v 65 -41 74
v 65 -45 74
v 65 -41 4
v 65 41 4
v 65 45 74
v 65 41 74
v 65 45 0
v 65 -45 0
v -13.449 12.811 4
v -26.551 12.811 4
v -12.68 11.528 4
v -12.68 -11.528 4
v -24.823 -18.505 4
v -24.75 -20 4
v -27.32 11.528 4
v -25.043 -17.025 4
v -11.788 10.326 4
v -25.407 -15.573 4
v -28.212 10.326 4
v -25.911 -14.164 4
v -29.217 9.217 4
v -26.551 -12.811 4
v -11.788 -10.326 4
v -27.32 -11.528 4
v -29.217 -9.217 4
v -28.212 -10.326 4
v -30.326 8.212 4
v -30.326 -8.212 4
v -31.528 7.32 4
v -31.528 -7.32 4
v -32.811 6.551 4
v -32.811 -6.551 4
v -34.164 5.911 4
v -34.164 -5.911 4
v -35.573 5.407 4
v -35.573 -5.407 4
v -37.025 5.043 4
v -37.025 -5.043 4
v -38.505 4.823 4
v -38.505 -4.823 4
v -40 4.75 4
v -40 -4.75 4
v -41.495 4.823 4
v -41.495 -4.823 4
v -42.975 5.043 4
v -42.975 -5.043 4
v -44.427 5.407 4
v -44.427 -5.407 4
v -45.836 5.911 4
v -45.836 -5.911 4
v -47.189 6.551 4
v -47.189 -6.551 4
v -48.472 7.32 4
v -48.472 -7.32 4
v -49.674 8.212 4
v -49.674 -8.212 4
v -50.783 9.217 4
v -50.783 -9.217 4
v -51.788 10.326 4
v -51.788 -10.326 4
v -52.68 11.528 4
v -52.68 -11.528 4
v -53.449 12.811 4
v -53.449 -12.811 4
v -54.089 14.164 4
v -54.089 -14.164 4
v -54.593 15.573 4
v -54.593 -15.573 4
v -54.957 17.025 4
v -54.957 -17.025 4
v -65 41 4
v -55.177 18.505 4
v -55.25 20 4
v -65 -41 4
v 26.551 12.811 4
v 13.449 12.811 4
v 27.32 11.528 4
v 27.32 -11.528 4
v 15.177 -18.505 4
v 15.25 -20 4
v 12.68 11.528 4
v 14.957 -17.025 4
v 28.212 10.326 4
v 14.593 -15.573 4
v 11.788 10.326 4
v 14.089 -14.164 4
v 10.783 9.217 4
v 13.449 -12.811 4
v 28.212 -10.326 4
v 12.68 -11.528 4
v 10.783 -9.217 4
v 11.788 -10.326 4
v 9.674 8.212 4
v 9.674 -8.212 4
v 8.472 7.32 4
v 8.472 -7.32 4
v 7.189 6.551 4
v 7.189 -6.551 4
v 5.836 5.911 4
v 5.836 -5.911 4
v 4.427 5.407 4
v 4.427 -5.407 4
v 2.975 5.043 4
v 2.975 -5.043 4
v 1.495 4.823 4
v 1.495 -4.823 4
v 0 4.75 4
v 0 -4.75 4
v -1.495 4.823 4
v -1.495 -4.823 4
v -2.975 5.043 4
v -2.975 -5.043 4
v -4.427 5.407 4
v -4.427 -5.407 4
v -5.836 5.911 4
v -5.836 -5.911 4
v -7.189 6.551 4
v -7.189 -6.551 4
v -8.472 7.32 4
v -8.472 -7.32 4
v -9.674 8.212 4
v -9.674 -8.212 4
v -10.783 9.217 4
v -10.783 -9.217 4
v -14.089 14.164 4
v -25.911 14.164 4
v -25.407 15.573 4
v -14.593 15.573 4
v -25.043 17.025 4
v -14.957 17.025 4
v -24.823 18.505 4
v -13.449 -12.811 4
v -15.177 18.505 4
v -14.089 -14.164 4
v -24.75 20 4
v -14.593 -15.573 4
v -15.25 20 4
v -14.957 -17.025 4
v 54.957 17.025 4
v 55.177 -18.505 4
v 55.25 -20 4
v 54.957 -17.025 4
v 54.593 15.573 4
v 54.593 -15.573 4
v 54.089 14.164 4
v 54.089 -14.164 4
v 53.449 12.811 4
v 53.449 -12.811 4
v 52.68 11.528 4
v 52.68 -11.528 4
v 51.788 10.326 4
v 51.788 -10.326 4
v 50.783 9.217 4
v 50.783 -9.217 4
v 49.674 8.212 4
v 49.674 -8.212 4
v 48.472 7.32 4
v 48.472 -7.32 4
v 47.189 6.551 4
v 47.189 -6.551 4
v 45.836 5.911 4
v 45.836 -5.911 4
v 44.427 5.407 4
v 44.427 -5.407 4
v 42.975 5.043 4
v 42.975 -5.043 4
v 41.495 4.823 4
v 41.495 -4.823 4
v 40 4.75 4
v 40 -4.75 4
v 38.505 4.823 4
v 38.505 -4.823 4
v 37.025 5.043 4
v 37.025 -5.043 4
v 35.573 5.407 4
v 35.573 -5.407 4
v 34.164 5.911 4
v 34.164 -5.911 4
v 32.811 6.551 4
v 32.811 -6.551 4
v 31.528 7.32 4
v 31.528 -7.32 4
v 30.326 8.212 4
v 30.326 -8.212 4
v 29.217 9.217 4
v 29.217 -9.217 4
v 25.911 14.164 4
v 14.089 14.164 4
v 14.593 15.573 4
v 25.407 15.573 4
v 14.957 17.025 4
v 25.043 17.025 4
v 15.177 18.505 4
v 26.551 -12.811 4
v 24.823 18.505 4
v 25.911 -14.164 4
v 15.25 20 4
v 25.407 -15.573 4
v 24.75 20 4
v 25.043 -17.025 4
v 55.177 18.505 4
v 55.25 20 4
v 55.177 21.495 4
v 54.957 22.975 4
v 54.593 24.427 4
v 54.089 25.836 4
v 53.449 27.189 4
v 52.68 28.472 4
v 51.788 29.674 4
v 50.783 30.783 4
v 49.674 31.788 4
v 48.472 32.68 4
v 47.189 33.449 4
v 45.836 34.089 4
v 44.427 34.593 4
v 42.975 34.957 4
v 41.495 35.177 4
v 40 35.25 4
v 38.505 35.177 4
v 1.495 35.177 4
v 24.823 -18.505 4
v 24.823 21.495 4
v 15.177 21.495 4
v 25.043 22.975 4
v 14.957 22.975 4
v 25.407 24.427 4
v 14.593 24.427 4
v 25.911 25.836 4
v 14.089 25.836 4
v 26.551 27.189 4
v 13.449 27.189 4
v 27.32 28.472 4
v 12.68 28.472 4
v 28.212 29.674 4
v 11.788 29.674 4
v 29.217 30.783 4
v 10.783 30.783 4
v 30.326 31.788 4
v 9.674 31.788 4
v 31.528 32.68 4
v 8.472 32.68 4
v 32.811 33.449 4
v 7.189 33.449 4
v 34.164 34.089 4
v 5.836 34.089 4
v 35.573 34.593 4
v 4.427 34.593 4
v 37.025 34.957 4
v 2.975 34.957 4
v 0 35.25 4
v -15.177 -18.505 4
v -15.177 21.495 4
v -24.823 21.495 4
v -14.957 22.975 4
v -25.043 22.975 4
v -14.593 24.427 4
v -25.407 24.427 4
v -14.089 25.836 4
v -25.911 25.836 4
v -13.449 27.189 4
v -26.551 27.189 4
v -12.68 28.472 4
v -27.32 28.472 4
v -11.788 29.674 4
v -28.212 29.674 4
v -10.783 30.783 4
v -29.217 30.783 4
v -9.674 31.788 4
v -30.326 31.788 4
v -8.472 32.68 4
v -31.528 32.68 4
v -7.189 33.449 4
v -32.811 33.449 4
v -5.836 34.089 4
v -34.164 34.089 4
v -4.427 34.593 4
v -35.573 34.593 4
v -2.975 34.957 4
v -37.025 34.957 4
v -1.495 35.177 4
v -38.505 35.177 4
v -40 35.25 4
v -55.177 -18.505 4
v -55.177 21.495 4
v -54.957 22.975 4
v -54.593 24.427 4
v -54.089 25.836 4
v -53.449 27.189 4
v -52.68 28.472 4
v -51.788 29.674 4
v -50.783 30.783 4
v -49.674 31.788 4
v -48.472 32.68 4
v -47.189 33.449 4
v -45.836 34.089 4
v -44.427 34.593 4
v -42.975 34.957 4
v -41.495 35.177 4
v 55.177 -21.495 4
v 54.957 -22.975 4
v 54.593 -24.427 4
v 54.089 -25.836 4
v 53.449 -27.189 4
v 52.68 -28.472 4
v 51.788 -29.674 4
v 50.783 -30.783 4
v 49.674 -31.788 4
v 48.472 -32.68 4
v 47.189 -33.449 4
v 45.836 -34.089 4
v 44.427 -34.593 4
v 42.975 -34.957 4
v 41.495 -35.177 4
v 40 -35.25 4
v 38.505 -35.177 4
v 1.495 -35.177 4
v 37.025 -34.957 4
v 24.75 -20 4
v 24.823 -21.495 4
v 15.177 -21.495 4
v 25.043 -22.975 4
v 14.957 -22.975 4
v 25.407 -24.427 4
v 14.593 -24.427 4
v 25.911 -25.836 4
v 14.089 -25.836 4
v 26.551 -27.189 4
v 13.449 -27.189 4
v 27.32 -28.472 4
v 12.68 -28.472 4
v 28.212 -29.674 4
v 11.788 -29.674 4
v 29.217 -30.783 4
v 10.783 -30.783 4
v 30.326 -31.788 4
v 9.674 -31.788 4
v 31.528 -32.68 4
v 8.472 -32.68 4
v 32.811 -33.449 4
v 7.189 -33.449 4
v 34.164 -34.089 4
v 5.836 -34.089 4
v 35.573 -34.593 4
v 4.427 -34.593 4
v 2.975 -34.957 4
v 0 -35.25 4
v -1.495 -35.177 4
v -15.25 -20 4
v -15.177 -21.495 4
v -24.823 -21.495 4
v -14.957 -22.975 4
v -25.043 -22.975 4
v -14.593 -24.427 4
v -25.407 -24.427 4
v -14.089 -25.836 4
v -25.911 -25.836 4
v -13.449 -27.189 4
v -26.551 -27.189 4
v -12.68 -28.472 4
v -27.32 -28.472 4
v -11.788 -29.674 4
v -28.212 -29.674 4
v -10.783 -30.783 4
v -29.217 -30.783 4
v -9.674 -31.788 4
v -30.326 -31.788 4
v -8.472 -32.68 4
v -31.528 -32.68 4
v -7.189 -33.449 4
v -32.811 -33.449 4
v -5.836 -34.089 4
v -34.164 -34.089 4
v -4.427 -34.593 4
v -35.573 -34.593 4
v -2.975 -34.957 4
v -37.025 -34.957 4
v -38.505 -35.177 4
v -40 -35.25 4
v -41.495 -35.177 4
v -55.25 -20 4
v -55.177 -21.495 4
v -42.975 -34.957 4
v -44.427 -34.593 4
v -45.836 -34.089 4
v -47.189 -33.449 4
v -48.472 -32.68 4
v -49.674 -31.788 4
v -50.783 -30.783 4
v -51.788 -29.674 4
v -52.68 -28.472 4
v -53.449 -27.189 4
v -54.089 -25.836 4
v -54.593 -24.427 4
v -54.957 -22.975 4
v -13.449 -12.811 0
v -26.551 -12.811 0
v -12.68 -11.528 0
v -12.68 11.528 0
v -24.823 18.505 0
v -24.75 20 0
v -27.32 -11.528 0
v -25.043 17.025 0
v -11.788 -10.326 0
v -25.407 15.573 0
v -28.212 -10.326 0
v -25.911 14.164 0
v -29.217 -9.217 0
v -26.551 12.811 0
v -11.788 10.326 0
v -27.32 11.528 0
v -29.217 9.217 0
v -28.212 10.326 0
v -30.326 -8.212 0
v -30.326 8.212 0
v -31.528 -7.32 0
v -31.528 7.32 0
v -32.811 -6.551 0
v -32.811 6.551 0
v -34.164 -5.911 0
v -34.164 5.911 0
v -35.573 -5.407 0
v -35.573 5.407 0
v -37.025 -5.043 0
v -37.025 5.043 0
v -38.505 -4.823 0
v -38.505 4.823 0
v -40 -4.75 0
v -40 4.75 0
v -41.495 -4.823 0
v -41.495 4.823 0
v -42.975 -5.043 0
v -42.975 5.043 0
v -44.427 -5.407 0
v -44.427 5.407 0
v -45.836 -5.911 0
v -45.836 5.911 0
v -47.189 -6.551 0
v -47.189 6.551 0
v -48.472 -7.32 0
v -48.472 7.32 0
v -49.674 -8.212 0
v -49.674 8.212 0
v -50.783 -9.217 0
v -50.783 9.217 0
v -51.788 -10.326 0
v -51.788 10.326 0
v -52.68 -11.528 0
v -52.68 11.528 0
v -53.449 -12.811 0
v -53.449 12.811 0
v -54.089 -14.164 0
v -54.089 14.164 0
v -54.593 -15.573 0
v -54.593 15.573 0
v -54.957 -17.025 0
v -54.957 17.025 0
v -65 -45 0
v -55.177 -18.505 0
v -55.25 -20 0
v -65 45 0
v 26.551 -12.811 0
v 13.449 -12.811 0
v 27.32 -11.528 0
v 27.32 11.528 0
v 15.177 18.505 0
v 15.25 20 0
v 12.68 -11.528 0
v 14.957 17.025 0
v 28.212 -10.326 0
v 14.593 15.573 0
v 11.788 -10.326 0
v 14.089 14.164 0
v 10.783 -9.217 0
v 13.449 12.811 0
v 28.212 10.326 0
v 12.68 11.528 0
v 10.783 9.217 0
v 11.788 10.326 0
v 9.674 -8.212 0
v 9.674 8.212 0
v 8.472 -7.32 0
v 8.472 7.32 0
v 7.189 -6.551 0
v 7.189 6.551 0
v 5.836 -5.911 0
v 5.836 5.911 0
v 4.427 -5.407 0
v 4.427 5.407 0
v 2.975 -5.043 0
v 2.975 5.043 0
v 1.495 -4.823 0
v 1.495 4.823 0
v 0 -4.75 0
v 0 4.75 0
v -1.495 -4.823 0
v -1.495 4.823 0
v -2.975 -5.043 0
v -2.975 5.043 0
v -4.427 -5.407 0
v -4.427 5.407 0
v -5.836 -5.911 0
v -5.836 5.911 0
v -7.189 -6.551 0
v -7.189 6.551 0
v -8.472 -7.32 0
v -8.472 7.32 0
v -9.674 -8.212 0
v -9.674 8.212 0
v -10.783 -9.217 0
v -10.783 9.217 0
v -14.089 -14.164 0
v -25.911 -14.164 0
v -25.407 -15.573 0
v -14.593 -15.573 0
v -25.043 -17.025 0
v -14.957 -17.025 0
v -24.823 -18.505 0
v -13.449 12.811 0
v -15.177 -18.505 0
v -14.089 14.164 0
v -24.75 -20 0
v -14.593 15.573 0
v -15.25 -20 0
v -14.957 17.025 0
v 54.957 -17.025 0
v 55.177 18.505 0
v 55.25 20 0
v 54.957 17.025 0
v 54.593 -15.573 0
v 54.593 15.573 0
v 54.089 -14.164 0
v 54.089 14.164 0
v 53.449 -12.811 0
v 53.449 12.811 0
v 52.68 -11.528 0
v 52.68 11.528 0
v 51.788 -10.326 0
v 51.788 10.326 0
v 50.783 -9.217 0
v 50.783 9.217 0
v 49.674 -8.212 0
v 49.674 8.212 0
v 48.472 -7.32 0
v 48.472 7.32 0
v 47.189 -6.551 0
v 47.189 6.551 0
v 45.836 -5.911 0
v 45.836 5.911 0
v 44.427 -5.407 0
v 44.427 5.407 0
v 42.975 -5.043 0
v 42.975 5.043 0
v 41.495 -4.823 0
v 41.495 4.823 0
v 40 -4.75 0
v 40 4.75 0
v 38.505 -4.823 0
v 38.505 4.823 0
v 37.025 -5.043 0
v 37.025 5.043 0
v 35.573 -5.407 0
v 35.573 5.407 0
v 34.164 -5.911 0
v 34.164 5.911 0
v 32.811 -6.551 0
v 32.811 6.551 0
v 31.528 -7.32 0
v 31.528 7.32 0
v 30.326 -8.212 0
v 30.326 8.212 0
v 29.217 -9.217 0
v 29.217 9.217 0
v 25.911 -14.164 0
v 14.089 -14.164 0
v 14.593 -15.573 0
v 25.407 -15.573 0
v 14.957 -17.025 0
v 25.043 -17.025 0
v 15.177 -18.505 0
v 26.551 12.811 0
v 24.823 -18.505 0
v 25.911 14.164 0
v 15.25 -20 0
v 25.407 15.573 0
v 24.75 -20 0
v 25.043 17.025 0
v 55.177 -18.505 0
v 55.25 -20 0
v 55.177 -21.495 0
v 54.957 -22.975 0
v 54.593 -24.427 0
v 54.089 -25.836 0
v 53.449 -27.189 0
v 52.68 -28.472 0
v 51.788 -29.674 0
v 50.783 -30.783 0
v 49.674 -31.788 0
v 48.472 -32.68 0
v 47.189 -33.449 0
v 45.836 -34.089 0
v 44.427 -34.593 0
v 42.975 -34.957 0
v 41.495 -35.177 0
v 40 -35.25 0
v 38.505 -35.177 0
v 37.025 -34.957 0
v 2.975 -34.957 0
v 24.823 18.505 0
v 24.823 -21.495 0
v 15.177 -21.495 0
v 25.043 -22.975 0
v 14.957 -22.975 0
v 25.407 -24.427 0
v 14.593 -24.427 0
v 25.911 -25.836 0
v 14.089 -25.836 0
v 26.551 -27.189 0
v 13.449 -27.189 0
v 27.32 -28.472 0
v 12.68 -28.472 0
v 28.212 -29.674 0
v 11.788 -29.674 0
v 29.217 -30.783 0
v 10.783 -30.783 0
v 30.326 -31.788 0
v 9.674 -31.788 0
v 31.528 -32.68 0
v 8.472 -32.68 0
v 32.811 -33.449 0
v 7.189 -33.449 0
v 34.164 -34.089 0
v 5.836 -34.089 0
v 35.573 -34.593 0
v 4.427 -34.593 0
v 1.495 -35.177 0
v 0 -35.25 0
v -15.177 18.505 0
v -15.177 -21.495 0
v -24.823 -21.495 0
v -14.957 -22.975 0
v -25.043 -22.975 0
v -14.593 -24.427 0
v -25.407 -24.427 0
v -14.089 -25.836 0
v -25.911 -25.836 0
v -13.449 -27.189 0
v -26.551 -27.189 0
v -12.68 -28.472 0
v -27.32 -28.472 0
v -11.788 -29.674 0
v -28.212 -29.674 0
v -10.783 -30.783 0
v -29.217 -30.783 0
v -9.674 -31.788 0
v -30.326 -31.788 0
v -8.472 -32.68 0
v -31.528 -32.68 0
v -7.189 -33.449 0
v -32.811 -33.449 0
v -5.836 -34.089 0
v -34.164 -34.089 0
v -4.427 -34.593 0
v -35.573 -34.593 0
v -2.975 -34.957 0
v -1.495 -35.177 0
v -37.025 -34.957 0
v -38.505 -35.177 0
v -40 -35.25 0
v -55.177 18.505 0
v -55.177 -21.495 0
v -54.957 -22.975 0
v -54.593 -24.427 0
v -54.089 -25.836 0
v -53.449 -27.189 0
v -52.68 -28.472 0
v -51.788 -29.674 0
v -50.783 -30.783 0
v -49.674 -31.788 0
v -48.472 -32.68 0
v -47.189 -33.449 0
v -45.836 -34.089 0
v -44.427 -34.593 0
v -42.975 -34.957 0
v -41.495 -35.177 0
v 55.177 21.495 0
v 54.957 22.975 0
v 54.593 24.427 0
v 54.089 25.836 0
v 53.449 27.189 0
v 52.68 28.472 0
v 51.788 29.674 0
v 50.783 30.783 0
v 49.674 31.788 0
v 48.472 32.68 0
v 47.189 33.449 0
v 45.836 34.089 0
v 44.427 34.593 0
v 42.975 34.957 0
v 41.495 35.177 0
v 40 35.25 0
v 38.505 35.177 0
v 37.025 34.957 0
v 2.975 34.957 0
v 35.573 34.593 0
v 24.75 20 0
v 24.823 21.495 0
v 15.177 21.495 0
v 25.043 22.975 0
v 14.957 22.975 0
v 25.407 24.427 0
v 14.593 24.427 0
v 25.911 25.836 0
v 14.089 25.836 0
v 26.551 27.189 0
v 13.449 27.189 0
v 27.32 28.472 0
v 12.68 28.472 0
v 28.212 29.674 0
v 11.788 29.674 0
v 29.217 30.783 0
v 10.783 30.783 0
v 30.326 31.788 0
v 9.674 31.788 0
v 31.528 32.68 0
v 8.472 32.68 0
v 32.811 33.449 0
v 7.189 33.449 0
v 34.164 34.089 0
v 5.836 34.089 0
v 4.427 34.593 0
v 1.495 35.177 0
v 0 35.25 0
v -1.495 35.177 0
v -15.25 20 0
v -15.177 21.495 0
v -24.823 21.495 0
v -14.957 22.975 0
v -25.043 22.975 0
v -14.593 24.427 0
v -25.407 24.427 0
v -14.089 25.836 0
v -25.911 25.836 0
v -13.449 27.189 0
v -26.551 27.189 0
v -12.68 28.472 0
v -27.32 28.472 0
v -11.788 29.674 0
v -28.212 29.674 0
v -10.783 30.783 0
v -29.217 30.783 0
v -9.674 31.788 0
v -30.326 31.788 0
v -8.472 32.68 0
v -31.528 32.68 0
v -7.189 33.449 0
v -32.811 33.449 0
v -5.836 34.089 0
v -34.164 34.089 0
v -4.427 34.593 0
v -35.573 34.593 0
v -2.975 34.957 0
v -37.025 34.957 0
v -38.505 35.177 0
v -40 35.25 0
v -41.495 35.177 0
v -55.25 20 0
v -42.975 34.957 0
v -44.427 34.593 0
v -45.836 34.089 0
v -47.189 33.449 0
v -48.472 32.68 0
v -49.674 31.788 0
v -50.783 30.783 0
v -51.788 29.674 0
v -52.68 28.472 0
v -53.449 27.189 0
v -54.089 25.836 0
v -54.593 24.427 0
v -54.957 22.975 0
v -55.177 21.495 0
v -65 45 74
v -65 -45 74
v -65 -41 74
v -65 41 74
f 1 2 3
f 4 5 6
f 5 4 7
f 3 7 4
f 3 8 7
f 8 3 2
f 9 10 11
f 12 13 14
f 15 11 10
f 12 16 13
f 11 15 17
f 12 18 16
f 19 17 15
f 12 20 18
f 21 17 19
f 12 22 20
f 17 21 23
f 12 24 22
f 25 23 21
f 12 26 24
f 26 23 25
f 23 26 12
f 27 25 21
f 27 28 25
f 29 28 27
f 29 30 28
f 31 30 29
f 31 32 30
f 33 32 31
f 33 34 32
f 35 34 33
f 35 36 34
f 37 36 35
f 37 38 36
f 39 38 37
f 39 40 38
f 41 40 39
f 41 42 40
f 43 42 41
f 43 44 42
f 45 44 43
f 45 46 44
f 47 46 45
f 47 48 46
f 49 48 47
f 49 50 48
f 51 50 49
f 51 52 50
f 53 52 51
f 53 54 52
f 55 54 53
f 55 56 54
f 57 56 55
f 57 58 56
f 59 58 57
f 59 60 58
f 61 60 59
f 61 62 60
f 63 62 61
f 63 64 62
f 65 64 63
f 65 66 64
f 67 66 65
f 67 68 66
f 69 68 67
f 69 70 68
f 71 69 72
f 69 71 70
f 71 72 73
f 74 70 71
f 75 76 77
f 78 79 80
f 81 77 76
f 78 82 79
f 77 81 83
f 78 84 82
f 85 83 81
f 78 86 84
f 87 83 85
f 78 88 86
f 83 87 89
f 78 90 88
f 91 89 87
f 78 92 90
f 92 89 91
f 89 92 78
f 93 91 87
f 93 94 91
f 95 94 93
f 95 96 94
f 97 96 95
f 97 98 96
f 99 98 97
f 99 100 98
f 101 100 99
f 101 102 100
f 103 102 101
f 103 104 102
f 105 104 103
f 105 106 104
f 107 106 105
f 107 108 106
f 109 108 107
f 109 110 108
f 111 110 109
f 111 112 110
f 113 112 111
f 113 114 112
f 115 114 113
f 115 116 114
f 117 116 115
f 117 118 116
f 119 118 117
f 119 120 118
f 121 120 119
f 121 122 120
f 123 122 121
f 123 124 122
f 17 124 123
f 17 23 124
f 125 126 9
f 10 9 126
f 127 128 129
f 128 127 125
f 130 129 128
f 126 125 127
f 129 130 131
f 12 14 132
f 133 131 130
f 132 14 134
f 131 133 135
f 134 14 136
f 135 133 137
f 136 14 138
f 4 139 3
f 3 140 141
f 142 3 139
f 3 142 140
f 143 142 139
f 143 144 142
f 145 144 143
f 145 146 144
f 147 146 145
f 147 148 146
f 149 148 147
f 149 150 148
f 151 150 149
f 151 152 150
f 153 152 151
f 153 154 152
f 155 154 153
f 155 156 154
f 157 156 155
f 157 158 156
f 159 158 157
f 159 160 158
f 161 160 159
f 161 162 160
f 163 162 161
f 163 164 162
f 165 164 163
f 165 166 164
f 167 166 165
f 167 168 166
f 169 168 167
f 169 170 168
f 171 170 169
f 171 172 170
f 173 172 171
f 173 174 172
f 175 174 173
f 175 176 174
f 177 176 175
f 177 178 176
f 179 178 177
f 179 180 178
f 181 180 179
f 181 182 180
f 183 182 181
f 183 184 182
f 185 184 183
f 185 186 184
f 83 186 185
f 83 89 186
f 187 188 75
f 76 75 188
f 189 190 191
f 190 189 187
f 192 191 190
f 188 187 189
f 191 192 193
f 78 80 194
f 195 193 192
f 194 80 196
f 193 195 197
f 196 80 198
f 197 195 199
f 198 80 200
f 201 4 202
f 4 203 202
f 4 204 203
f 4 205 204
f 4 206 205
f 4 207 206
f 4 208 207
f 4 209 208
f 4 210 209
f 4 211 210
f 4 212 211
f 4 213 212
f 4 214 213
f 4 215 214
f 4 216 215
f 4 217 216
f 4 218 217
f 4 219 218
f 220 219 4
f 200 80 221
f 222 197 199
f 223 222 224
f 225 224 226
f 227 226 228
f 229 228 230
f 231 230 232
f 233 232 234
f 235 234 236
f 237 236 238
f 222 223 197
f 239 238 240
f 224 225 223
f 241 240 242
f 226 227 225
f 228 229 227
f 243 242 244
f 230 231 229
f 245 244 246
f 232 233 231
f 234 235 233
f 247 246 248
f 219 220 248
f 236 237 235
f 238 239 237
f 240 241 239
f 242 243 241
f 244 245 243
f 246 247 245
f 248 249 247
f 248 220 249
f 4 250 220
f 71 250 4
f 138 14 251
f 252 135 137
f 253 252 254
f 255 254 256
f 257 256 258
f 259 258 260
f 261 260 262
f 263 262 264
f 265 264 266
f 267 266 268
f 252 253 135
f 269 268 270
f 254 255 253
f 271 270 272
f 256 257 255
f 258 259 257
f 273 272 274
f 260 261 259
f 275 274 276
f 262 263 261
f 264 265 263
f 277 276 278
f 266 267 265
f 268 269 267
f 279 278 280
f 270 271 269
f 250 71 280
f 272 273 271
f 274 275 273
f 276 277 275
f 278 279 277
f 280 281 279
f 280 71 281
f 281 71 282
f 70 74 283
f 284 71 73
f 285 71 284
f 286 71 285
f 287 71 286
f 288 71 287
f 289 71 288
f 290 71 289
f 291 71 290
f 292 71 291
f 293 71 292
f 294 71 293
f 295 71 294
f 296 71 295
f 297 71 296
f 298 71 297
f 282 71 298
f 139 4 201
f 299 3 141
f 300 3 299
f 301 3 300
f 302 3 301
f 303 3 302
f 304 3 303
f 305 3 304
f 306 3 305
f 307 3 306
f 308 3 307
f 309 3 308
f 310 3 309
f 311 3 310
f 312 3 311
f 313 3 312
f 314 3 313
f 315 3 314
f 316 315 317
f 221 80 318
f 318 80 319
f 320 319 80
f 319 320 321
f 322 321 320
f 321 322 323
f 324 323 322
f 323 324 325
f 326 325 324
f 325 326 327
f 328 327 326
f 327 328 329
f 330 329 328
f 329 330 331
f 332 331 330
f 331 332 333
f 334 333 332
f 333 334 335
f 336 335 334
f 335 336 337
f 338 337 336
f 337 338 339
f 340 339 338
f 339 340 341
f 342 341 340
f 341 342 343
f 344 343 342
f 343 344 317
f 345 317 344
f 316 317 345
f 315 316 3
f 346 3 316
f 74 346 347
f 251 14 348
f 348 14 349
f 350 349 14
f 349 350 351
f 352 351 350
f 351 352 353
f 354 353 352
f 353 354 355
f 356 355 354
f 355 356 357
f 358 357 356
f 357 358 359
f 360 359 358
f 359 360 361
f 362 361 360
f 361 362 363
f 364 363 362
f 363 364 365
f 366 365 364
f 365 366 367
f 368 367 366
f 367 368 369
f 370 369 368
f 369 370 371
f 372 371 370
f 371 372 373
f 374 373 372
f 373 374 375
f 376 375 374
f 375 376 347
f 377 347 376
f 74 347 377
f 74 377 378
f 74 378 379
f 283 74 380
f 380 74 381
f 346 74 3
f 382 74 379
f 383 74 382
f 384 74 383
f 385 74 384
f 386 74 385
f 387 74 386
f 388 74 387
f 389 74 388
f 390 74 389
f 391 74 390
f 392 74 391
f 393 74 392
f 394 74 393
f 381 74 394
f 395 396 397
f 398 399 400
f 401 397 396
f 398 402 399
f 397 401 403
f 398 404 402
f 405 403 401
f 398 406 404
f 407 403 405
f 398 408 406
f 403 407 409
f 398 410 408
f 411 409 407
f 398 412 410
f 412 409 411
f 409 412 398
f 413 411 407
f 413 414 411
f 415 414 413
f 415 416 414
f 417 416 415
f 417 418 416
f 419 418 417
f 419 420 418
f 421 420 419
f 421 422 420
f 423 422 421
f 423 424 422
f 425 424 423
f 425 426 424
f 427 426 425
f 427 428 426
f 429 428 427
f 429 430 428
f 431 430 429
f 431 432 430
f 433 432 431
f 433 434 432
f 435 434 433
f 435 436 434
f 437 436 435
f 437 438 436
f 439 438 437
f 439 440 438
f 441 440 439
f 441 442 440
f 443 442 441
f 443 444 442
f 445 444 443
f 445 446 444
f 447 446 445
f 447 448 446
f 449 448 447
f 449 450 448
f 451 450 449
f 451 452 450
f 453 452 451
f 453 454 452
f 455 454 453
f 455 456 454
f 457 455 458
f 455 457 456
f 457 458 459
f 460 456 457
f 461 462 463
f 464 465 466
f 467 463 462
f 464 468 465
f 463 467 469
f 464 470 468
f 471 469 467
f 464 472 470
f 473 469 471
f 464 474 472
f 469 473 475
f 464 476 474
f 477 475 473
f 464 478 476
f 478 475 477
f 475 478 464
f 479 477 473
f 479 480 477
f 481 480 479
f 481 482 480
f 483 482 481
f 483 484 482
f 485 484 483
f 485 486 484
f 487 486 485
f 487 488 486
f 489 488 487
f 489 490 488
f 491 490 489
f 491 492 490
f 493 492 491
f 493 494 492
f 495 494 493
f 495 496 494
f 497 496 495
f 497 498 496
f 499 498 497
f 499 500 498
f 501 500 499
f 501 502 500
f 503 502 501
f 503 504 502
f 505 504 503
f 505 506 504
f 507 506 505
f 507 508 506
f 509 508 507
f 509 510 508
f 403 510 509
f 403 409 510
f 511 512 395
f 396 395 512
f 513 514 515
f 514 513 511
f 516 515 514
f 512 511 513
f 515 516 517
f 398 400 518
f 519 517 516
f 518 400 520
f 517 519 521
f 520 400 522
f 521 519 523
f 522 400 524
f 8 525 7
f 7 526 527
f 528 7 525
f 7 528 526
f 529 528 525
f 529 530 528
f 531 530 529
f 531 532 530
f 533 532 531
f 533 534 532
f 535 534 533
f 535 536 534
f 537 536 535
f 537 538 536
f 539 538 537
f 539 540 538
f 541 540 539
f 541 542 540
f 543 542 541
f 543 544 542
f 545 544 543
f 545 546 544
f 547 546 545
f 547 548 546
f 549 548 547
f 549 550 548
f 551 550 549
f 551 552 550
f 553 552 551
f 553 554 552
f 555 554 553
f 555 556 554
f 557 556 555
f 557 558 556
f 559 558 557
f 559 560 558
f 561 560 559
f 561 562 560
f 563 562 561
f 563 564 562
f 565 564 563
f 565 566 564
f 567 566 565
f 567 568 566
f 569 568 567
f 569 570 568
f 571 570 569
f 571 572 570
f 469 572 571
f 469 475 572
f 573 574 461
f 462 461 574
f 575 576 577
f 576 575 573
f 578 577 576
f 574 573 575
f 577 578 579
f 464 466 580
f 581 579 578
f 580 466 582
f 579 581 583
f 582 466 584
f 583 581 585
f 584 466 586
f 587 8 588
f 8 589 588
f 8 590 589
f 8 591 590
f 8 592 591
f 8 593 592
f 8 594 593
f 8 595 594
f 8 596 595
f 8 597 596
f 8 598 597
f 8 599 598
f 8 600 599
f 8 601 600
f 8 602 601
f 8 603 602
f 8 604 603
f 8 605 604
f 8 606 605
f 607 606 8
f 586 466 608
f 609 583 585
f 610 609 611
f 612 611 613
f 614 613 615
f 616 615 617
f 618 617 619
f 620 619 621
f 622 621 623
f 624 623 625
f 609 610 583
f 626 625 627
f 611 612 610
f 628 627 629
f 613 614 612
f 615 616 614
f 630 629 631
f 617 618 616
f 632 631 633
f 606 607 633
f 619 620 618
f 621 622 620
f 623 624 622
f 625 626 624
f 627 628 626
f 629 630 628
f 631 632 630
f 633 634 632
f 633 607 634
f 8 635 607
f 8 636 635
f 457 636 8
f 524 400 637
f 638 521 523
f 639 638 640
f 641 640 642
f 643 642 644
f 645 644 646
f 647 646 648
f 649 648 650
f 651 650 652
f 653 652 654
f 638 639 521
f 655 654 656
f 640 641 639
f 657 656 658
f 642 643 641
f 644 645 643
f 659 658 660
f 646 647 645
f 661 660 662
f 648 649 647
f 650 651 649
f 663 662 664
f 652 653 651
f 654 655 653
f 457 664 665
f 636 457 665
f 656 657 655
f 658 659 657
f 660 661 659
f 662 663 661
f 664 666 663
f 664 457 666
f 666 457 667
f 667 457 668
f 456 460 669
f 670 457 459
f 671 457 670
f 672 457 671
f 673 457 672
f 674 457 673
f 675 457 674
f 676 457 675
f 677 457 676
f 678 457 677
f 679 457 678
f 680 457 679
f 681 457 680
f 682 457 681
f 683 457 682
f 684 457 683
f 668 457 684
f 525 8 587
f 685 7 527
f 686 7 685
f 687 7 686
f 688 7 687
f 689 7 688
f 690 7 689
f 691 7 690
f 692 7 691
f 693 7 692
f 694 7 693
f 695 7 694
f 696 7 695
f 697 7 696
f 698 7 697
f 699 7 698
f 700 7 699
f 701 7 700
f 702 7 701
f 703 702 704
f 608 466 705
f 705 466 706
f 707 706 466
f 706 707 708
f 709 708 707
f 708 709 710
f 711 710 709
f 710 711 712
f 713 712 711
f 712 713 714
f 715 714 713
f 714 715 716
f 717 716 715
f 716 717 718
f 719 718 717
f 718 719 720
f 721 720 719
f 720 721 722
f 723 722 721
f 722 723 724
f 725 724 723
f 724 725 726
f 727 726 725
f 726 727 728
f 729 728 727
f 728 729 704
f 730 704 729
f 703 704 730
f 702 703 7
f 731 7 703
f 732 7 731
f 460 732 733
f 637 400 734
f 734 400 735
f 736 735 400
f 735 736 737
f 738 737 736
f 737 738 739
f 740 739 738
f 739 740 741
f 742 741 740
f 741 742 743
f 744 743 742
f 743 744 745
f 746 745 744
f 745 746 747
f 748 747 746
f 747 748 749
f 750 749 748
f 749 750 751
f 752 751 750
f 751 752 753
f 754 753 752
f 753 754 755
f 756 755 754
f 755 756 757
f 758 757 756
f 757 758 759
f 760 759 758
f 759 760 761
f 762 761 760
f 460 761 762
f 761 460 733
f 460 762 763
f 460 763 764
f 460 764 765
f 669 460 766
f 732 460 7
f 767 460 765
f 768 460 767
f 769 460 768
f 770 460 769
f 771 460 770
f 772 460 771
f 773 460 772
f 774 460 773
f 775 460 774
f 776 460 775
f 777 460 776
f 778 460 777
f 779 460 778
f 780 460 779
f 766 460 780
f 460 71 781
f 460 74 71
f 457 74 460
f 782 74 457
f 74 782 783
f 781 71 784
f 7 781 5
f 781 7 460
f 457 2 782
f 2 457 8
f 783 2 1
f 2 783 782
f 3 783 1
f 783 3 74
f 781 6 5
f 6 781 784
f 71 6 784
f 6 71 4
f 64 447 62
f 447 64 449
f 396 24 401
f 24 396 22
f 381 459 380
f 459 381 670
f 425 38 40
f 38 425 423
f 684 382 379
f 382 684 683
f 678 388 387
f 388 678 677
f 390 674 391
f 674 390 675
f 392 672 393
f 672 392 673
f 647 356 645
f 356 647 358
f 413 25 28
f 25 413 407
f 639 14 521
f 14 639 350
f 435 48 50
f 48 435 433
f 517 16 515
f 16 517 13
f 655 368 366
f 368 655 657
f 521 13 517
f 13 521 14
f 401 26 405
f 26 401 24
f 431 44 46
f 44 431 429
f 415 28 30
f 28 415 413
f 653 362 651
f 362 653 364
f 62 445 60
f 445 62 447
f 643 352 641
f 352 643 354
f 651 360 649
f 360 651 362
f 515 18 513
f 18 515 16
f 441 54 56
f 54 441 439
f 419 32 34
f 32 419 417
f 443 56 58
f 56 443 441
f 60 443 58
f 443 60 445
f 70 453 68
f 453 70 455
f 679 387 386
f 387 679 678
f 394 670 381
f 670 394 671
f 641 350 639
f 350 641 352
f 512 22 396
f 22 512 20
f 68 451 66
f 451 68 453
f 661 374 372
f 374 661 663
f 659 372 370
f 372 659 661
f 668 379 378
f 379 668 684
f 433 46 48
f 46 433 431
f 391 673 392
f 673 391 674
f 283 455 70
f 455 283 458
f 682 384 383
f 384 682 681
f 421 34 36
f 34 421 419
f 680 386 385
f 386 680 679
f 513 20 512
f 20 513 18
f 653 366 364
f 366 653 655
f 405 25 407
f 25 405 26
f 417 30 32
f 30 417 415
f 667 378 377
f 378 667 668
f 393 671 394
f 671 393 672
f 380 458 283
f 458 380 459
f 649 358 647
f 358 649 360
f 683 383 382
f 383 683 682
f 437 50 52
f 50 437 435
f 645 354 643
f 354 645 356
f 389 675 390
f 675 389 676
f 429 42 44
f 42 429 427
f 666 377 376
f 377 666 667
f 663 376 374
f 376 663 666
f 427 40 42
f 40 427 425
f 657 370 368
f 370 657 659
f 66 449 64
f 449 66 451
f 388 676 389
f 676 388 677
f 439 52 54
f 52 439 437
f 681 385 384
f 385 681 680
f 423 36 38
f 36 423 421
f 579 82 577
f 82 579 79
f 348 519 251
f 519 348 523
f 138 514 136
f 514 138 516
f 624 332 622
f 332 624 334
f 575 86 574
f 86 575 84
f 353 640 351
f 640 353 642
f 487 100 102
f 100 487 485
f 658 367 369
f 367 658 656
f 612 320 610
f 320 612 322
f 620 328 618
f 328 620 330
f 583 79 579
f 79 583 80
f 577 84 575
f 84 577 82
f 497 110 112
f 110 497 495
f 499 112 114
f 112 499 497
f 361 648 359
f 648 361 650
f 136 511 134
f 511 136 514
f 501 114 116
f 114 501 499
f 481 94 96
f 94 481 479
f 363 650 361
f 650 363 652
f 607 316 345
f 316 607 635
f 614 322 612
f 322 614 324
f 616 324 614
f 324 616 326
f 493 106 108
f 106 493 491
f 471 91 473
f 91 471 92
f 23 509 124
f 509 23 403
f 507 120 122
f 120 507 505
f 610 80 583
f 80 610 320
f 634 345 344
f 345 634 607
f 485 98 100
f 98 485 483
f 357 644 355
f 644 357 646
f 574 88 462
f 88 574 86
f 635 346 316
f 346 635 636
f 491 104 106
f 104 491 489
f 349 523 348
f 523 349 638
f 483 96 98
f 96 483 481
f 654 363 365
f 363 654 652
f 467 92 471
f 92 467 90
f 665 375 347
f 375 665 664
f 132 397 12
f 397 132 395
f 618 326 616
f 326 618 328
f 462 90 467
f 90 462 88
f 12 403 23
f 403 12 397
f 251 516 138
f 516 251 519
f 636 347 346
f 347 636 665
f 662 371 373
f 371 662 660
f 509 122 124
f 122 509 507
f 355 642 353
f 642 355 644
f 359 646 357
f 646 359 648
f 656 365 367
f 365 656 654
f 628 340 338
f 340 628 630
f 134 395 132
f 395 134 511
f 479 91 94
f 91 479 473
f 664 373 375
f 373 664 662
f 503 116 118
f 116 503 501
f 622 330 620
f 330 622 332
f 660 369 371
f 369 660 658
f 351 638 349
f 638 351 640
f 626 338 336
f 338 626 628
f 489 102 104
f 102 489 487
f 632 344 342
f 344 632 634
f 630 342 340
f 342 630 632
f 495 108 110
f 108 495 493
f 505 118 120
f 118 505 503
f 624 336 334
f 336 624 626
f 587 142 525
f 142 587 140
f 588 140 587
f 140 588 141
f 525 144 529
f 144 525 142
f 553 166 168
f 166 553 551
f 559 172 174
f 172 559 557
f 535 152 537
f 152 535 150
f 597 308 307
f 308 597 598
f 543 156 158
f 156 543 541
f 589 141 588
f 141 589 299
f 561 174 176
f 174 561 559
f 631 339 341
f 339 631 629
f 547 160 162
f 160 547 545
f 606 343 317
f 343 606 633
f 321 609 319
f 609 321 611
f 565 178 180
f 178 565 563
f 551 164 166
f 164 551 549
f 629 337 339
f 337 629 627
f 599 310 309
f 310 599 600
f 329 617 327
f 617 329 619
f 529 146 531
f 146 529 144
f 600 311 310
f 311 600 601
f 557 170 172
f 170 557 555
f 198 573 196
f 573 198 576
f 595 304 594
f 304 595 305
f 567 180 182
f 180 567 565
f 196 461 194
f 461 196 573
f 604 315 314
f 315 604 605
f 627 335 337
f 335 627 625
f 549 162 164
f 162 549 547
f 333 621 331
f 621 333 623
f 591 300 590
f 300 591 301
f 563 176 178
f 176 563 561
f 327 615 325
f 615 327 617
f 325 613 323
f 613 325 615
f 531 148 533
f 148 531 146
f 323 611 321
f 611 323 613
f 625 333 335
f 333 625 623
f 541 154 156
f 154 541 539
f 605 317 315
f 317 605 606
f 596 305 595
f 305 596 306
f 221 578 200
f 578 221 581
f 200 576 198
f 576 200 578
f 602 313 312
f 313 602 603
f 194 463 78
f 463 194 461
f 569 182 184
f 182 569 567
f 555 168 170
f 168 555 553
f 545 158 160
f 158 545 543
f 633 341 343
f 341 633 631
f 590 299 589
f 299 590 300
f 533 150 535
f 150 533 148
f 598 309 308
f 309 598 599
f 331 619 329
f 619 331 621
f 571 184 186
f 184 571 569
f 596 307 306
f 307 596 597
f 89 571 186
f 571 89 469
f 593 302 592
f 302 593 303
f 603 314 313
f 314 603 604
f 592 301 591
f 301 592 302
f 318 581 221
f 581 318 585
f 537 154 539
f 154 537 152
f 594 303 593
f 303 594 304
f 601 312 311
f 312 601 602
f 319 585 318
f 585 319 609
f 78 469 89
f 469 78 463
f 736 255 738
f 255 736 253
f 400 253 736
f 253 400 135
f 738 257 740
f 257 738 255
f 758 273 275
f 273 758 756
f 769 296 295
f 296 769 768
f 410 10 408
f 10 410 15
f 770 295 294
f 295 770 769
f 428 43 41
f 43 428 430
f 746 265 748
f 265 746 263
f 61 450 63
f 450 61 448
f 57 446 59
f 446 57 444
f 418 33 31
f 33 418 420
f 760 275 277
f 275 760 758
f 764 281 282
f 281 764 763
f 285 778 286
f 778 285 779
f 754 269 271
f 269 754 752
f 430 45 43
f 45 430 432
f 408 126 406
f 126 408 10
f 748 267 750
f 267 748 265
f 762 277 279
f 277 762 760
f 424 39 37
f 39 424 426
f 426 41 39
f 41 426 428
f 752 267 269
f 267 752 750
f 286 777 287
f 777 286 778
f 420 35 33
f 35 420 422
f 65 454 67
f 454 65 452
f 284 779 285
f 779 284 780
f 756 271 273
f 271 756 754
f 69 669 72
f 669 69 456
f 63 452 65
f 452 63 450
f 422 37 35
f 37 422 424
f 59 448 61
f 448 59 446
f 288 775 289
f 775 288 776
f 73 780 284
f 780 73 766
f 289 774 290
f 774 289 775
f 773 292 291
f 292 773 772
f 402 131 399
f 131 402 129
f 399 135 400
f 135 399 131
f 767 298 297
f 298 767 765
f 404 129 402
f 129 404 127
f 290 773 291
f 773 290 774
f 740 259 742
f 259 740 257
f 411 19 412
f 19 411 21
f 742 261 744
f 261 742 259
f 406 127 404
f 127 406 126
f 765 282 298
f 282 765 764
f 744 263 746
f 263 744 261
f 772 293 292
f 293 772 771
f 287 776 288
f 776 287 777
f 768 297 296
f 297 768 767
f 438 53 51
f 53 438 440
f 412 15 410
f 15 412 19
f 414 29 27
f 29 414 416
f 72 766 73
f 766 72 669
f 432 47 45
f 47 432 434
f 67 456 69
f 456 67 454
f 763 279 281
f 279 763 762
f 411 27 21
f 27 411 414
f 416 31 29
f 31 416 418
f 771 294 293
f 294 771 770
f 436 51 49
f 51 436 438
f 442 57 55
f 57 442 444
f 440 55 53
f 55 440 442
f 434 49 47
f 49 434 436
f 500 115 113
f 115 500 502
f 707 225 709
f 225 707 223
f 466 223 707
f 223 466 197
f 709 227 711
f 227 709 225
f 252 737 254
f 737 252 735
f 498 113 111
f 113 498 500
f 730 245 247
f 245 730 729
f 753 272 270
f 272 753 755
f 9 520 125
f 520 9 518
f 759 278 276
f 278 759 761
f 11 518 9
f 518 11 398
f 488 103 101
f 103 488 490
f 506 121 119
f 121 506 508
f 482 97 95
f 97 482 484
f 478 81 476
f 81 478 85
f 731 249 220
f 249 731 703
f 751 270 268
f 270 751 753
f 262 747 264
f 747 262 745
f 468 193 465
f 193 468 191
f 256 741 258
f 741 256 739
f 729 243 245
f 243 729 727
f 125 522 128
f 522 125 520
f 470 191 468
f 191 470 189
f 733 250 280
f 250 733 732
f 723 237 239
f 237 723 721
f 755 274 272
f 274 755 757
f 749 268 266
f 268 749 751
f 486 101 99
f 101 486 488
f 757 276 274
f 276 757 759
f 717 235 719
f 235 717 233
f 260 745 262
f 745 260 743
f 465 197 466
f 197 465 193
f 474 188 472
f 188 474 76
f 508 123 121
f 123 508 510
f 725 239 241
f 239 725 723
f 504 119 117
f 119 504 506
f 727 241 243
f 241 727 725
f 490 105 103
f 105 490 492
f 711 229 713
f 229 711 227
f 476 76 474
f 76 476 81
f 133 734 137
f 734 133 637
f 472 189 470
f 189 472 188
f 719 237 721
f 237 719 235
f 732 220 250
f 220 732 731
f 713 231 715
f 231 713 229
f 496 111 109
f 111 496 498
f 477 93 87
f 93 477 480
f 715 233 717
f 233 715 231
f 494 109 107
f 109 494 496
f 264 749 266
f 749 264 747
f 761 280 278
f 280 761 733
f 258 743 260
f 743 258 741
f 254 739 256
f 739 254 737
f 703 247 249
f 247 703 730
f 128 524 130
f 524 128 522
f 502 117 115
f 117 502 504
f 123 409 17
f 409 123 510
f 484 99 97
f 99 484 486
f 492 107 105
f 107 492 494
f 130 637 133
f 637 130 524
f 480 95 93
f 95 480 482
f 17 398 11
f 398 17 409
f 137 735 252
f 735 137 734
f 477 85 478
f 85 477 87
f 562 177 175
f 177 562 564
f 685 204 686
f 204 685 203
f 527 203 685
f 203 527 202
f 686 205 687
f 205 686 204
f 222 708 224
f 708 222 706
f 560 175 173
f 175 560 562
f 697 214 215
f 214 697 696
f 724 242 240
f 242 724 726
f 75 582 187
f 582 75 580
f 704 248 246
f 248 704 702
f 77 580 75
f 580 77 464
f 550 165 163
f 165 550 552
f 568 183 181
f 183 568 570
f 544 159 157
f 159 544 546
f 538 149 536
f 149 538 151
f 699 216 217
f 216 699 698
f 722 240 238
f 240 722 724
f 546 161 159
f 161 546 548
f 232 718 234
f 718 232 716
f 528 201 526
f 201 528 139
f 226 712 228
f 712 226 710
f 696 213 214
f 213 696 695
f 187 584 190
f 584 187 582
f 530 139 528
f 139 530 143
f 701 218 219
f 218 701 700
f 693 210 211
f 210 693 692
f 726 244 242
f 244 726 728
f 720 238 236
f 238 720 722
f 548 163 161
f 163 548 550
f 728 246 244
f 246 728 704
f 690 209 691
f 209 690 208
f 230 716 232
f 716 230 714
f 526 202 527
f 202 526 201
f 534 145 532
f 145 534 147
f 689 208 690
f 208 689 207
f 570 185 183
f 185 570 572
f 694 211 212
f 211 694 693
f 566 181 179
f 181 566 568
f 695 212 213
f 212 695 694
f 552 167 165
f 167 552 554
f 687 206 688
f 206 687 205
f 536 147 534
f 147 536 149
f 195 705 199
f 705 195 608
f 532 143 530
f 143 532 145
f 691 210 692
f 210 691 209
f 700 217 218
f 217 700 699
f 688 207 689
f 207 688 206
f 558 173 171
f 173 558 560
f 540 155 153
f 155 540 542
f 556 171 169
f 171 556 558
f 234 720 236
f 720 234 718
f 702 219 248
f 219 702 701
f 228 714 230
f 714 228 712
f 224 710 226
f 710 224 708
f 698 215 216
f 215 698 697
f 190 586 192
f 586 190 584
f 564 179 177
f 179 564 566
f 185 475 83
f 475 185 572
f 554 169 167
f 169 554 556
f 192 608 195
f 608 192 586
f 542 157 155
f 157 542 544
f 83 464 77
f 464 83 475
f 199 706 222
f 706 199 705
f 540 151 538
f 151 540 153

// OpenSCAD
// Dimensions (measured in mm)
base_length_x = 130;      // X dimension of base
base_width_y = 90;        // Y dimension of base
base_thickness = 4;       // Z thickness of base

hole_diameter = 30.5;     // Diameter of tube holes (50mL Falcon)
holes_spacing = 40;       // Center-to-center spacing between holes

wall_length_x = 130;      // X dimension of wall
wall_thickness_y = 4;     // Y thickness of wall
wall_height = 70;         // Z height of wall (from z=4 to z=74)

$fn = 64;

// Hole positions (2 rows × 3 columns, centered on base)
hole_positions = [
  [-40, -20],
  [0, -20],
  [40, -20],
  [-40, 20],
  [0, 20],
  [40, 20]
];

// Create the assembly
difference() {
  union() {
    // Base plate (centered in X and Y, Z from 0 to 4)
    translate([0, 0, base_thickness/2])
      cube([base_length_x, base_width_y, base_thickness], center = true);
    
    // Wall 1 (at Y = -45 edge, running from Z=4 to Z=74)
    translate([0, -(base_width_y/2 - wall_thickness_y/2), base_thickness + wall_height/2])
      cube([wall_length_x, wall_thickness_y, wall_height], center = true);
    
    // Wall 2 (at Y = +45 edge, running from Z=4 to Z=74)
    translate([0, (base_width_y/2 - wall_thickness_y/2), base_thickness + wall_height/2])
      cube([wall_length_x, wall_thickness_y, wall_height], center = true);
  }
  
  // Cut holes in the base (extends slightly past to avoid coplanar faces)
  for (pos = hole_positions) {
    translate([pos[0], pos[1], -0.5])
      cylinder(h = base_thickness + 1, r = hole_diameter / 2, $fn = 64);
  }
}
